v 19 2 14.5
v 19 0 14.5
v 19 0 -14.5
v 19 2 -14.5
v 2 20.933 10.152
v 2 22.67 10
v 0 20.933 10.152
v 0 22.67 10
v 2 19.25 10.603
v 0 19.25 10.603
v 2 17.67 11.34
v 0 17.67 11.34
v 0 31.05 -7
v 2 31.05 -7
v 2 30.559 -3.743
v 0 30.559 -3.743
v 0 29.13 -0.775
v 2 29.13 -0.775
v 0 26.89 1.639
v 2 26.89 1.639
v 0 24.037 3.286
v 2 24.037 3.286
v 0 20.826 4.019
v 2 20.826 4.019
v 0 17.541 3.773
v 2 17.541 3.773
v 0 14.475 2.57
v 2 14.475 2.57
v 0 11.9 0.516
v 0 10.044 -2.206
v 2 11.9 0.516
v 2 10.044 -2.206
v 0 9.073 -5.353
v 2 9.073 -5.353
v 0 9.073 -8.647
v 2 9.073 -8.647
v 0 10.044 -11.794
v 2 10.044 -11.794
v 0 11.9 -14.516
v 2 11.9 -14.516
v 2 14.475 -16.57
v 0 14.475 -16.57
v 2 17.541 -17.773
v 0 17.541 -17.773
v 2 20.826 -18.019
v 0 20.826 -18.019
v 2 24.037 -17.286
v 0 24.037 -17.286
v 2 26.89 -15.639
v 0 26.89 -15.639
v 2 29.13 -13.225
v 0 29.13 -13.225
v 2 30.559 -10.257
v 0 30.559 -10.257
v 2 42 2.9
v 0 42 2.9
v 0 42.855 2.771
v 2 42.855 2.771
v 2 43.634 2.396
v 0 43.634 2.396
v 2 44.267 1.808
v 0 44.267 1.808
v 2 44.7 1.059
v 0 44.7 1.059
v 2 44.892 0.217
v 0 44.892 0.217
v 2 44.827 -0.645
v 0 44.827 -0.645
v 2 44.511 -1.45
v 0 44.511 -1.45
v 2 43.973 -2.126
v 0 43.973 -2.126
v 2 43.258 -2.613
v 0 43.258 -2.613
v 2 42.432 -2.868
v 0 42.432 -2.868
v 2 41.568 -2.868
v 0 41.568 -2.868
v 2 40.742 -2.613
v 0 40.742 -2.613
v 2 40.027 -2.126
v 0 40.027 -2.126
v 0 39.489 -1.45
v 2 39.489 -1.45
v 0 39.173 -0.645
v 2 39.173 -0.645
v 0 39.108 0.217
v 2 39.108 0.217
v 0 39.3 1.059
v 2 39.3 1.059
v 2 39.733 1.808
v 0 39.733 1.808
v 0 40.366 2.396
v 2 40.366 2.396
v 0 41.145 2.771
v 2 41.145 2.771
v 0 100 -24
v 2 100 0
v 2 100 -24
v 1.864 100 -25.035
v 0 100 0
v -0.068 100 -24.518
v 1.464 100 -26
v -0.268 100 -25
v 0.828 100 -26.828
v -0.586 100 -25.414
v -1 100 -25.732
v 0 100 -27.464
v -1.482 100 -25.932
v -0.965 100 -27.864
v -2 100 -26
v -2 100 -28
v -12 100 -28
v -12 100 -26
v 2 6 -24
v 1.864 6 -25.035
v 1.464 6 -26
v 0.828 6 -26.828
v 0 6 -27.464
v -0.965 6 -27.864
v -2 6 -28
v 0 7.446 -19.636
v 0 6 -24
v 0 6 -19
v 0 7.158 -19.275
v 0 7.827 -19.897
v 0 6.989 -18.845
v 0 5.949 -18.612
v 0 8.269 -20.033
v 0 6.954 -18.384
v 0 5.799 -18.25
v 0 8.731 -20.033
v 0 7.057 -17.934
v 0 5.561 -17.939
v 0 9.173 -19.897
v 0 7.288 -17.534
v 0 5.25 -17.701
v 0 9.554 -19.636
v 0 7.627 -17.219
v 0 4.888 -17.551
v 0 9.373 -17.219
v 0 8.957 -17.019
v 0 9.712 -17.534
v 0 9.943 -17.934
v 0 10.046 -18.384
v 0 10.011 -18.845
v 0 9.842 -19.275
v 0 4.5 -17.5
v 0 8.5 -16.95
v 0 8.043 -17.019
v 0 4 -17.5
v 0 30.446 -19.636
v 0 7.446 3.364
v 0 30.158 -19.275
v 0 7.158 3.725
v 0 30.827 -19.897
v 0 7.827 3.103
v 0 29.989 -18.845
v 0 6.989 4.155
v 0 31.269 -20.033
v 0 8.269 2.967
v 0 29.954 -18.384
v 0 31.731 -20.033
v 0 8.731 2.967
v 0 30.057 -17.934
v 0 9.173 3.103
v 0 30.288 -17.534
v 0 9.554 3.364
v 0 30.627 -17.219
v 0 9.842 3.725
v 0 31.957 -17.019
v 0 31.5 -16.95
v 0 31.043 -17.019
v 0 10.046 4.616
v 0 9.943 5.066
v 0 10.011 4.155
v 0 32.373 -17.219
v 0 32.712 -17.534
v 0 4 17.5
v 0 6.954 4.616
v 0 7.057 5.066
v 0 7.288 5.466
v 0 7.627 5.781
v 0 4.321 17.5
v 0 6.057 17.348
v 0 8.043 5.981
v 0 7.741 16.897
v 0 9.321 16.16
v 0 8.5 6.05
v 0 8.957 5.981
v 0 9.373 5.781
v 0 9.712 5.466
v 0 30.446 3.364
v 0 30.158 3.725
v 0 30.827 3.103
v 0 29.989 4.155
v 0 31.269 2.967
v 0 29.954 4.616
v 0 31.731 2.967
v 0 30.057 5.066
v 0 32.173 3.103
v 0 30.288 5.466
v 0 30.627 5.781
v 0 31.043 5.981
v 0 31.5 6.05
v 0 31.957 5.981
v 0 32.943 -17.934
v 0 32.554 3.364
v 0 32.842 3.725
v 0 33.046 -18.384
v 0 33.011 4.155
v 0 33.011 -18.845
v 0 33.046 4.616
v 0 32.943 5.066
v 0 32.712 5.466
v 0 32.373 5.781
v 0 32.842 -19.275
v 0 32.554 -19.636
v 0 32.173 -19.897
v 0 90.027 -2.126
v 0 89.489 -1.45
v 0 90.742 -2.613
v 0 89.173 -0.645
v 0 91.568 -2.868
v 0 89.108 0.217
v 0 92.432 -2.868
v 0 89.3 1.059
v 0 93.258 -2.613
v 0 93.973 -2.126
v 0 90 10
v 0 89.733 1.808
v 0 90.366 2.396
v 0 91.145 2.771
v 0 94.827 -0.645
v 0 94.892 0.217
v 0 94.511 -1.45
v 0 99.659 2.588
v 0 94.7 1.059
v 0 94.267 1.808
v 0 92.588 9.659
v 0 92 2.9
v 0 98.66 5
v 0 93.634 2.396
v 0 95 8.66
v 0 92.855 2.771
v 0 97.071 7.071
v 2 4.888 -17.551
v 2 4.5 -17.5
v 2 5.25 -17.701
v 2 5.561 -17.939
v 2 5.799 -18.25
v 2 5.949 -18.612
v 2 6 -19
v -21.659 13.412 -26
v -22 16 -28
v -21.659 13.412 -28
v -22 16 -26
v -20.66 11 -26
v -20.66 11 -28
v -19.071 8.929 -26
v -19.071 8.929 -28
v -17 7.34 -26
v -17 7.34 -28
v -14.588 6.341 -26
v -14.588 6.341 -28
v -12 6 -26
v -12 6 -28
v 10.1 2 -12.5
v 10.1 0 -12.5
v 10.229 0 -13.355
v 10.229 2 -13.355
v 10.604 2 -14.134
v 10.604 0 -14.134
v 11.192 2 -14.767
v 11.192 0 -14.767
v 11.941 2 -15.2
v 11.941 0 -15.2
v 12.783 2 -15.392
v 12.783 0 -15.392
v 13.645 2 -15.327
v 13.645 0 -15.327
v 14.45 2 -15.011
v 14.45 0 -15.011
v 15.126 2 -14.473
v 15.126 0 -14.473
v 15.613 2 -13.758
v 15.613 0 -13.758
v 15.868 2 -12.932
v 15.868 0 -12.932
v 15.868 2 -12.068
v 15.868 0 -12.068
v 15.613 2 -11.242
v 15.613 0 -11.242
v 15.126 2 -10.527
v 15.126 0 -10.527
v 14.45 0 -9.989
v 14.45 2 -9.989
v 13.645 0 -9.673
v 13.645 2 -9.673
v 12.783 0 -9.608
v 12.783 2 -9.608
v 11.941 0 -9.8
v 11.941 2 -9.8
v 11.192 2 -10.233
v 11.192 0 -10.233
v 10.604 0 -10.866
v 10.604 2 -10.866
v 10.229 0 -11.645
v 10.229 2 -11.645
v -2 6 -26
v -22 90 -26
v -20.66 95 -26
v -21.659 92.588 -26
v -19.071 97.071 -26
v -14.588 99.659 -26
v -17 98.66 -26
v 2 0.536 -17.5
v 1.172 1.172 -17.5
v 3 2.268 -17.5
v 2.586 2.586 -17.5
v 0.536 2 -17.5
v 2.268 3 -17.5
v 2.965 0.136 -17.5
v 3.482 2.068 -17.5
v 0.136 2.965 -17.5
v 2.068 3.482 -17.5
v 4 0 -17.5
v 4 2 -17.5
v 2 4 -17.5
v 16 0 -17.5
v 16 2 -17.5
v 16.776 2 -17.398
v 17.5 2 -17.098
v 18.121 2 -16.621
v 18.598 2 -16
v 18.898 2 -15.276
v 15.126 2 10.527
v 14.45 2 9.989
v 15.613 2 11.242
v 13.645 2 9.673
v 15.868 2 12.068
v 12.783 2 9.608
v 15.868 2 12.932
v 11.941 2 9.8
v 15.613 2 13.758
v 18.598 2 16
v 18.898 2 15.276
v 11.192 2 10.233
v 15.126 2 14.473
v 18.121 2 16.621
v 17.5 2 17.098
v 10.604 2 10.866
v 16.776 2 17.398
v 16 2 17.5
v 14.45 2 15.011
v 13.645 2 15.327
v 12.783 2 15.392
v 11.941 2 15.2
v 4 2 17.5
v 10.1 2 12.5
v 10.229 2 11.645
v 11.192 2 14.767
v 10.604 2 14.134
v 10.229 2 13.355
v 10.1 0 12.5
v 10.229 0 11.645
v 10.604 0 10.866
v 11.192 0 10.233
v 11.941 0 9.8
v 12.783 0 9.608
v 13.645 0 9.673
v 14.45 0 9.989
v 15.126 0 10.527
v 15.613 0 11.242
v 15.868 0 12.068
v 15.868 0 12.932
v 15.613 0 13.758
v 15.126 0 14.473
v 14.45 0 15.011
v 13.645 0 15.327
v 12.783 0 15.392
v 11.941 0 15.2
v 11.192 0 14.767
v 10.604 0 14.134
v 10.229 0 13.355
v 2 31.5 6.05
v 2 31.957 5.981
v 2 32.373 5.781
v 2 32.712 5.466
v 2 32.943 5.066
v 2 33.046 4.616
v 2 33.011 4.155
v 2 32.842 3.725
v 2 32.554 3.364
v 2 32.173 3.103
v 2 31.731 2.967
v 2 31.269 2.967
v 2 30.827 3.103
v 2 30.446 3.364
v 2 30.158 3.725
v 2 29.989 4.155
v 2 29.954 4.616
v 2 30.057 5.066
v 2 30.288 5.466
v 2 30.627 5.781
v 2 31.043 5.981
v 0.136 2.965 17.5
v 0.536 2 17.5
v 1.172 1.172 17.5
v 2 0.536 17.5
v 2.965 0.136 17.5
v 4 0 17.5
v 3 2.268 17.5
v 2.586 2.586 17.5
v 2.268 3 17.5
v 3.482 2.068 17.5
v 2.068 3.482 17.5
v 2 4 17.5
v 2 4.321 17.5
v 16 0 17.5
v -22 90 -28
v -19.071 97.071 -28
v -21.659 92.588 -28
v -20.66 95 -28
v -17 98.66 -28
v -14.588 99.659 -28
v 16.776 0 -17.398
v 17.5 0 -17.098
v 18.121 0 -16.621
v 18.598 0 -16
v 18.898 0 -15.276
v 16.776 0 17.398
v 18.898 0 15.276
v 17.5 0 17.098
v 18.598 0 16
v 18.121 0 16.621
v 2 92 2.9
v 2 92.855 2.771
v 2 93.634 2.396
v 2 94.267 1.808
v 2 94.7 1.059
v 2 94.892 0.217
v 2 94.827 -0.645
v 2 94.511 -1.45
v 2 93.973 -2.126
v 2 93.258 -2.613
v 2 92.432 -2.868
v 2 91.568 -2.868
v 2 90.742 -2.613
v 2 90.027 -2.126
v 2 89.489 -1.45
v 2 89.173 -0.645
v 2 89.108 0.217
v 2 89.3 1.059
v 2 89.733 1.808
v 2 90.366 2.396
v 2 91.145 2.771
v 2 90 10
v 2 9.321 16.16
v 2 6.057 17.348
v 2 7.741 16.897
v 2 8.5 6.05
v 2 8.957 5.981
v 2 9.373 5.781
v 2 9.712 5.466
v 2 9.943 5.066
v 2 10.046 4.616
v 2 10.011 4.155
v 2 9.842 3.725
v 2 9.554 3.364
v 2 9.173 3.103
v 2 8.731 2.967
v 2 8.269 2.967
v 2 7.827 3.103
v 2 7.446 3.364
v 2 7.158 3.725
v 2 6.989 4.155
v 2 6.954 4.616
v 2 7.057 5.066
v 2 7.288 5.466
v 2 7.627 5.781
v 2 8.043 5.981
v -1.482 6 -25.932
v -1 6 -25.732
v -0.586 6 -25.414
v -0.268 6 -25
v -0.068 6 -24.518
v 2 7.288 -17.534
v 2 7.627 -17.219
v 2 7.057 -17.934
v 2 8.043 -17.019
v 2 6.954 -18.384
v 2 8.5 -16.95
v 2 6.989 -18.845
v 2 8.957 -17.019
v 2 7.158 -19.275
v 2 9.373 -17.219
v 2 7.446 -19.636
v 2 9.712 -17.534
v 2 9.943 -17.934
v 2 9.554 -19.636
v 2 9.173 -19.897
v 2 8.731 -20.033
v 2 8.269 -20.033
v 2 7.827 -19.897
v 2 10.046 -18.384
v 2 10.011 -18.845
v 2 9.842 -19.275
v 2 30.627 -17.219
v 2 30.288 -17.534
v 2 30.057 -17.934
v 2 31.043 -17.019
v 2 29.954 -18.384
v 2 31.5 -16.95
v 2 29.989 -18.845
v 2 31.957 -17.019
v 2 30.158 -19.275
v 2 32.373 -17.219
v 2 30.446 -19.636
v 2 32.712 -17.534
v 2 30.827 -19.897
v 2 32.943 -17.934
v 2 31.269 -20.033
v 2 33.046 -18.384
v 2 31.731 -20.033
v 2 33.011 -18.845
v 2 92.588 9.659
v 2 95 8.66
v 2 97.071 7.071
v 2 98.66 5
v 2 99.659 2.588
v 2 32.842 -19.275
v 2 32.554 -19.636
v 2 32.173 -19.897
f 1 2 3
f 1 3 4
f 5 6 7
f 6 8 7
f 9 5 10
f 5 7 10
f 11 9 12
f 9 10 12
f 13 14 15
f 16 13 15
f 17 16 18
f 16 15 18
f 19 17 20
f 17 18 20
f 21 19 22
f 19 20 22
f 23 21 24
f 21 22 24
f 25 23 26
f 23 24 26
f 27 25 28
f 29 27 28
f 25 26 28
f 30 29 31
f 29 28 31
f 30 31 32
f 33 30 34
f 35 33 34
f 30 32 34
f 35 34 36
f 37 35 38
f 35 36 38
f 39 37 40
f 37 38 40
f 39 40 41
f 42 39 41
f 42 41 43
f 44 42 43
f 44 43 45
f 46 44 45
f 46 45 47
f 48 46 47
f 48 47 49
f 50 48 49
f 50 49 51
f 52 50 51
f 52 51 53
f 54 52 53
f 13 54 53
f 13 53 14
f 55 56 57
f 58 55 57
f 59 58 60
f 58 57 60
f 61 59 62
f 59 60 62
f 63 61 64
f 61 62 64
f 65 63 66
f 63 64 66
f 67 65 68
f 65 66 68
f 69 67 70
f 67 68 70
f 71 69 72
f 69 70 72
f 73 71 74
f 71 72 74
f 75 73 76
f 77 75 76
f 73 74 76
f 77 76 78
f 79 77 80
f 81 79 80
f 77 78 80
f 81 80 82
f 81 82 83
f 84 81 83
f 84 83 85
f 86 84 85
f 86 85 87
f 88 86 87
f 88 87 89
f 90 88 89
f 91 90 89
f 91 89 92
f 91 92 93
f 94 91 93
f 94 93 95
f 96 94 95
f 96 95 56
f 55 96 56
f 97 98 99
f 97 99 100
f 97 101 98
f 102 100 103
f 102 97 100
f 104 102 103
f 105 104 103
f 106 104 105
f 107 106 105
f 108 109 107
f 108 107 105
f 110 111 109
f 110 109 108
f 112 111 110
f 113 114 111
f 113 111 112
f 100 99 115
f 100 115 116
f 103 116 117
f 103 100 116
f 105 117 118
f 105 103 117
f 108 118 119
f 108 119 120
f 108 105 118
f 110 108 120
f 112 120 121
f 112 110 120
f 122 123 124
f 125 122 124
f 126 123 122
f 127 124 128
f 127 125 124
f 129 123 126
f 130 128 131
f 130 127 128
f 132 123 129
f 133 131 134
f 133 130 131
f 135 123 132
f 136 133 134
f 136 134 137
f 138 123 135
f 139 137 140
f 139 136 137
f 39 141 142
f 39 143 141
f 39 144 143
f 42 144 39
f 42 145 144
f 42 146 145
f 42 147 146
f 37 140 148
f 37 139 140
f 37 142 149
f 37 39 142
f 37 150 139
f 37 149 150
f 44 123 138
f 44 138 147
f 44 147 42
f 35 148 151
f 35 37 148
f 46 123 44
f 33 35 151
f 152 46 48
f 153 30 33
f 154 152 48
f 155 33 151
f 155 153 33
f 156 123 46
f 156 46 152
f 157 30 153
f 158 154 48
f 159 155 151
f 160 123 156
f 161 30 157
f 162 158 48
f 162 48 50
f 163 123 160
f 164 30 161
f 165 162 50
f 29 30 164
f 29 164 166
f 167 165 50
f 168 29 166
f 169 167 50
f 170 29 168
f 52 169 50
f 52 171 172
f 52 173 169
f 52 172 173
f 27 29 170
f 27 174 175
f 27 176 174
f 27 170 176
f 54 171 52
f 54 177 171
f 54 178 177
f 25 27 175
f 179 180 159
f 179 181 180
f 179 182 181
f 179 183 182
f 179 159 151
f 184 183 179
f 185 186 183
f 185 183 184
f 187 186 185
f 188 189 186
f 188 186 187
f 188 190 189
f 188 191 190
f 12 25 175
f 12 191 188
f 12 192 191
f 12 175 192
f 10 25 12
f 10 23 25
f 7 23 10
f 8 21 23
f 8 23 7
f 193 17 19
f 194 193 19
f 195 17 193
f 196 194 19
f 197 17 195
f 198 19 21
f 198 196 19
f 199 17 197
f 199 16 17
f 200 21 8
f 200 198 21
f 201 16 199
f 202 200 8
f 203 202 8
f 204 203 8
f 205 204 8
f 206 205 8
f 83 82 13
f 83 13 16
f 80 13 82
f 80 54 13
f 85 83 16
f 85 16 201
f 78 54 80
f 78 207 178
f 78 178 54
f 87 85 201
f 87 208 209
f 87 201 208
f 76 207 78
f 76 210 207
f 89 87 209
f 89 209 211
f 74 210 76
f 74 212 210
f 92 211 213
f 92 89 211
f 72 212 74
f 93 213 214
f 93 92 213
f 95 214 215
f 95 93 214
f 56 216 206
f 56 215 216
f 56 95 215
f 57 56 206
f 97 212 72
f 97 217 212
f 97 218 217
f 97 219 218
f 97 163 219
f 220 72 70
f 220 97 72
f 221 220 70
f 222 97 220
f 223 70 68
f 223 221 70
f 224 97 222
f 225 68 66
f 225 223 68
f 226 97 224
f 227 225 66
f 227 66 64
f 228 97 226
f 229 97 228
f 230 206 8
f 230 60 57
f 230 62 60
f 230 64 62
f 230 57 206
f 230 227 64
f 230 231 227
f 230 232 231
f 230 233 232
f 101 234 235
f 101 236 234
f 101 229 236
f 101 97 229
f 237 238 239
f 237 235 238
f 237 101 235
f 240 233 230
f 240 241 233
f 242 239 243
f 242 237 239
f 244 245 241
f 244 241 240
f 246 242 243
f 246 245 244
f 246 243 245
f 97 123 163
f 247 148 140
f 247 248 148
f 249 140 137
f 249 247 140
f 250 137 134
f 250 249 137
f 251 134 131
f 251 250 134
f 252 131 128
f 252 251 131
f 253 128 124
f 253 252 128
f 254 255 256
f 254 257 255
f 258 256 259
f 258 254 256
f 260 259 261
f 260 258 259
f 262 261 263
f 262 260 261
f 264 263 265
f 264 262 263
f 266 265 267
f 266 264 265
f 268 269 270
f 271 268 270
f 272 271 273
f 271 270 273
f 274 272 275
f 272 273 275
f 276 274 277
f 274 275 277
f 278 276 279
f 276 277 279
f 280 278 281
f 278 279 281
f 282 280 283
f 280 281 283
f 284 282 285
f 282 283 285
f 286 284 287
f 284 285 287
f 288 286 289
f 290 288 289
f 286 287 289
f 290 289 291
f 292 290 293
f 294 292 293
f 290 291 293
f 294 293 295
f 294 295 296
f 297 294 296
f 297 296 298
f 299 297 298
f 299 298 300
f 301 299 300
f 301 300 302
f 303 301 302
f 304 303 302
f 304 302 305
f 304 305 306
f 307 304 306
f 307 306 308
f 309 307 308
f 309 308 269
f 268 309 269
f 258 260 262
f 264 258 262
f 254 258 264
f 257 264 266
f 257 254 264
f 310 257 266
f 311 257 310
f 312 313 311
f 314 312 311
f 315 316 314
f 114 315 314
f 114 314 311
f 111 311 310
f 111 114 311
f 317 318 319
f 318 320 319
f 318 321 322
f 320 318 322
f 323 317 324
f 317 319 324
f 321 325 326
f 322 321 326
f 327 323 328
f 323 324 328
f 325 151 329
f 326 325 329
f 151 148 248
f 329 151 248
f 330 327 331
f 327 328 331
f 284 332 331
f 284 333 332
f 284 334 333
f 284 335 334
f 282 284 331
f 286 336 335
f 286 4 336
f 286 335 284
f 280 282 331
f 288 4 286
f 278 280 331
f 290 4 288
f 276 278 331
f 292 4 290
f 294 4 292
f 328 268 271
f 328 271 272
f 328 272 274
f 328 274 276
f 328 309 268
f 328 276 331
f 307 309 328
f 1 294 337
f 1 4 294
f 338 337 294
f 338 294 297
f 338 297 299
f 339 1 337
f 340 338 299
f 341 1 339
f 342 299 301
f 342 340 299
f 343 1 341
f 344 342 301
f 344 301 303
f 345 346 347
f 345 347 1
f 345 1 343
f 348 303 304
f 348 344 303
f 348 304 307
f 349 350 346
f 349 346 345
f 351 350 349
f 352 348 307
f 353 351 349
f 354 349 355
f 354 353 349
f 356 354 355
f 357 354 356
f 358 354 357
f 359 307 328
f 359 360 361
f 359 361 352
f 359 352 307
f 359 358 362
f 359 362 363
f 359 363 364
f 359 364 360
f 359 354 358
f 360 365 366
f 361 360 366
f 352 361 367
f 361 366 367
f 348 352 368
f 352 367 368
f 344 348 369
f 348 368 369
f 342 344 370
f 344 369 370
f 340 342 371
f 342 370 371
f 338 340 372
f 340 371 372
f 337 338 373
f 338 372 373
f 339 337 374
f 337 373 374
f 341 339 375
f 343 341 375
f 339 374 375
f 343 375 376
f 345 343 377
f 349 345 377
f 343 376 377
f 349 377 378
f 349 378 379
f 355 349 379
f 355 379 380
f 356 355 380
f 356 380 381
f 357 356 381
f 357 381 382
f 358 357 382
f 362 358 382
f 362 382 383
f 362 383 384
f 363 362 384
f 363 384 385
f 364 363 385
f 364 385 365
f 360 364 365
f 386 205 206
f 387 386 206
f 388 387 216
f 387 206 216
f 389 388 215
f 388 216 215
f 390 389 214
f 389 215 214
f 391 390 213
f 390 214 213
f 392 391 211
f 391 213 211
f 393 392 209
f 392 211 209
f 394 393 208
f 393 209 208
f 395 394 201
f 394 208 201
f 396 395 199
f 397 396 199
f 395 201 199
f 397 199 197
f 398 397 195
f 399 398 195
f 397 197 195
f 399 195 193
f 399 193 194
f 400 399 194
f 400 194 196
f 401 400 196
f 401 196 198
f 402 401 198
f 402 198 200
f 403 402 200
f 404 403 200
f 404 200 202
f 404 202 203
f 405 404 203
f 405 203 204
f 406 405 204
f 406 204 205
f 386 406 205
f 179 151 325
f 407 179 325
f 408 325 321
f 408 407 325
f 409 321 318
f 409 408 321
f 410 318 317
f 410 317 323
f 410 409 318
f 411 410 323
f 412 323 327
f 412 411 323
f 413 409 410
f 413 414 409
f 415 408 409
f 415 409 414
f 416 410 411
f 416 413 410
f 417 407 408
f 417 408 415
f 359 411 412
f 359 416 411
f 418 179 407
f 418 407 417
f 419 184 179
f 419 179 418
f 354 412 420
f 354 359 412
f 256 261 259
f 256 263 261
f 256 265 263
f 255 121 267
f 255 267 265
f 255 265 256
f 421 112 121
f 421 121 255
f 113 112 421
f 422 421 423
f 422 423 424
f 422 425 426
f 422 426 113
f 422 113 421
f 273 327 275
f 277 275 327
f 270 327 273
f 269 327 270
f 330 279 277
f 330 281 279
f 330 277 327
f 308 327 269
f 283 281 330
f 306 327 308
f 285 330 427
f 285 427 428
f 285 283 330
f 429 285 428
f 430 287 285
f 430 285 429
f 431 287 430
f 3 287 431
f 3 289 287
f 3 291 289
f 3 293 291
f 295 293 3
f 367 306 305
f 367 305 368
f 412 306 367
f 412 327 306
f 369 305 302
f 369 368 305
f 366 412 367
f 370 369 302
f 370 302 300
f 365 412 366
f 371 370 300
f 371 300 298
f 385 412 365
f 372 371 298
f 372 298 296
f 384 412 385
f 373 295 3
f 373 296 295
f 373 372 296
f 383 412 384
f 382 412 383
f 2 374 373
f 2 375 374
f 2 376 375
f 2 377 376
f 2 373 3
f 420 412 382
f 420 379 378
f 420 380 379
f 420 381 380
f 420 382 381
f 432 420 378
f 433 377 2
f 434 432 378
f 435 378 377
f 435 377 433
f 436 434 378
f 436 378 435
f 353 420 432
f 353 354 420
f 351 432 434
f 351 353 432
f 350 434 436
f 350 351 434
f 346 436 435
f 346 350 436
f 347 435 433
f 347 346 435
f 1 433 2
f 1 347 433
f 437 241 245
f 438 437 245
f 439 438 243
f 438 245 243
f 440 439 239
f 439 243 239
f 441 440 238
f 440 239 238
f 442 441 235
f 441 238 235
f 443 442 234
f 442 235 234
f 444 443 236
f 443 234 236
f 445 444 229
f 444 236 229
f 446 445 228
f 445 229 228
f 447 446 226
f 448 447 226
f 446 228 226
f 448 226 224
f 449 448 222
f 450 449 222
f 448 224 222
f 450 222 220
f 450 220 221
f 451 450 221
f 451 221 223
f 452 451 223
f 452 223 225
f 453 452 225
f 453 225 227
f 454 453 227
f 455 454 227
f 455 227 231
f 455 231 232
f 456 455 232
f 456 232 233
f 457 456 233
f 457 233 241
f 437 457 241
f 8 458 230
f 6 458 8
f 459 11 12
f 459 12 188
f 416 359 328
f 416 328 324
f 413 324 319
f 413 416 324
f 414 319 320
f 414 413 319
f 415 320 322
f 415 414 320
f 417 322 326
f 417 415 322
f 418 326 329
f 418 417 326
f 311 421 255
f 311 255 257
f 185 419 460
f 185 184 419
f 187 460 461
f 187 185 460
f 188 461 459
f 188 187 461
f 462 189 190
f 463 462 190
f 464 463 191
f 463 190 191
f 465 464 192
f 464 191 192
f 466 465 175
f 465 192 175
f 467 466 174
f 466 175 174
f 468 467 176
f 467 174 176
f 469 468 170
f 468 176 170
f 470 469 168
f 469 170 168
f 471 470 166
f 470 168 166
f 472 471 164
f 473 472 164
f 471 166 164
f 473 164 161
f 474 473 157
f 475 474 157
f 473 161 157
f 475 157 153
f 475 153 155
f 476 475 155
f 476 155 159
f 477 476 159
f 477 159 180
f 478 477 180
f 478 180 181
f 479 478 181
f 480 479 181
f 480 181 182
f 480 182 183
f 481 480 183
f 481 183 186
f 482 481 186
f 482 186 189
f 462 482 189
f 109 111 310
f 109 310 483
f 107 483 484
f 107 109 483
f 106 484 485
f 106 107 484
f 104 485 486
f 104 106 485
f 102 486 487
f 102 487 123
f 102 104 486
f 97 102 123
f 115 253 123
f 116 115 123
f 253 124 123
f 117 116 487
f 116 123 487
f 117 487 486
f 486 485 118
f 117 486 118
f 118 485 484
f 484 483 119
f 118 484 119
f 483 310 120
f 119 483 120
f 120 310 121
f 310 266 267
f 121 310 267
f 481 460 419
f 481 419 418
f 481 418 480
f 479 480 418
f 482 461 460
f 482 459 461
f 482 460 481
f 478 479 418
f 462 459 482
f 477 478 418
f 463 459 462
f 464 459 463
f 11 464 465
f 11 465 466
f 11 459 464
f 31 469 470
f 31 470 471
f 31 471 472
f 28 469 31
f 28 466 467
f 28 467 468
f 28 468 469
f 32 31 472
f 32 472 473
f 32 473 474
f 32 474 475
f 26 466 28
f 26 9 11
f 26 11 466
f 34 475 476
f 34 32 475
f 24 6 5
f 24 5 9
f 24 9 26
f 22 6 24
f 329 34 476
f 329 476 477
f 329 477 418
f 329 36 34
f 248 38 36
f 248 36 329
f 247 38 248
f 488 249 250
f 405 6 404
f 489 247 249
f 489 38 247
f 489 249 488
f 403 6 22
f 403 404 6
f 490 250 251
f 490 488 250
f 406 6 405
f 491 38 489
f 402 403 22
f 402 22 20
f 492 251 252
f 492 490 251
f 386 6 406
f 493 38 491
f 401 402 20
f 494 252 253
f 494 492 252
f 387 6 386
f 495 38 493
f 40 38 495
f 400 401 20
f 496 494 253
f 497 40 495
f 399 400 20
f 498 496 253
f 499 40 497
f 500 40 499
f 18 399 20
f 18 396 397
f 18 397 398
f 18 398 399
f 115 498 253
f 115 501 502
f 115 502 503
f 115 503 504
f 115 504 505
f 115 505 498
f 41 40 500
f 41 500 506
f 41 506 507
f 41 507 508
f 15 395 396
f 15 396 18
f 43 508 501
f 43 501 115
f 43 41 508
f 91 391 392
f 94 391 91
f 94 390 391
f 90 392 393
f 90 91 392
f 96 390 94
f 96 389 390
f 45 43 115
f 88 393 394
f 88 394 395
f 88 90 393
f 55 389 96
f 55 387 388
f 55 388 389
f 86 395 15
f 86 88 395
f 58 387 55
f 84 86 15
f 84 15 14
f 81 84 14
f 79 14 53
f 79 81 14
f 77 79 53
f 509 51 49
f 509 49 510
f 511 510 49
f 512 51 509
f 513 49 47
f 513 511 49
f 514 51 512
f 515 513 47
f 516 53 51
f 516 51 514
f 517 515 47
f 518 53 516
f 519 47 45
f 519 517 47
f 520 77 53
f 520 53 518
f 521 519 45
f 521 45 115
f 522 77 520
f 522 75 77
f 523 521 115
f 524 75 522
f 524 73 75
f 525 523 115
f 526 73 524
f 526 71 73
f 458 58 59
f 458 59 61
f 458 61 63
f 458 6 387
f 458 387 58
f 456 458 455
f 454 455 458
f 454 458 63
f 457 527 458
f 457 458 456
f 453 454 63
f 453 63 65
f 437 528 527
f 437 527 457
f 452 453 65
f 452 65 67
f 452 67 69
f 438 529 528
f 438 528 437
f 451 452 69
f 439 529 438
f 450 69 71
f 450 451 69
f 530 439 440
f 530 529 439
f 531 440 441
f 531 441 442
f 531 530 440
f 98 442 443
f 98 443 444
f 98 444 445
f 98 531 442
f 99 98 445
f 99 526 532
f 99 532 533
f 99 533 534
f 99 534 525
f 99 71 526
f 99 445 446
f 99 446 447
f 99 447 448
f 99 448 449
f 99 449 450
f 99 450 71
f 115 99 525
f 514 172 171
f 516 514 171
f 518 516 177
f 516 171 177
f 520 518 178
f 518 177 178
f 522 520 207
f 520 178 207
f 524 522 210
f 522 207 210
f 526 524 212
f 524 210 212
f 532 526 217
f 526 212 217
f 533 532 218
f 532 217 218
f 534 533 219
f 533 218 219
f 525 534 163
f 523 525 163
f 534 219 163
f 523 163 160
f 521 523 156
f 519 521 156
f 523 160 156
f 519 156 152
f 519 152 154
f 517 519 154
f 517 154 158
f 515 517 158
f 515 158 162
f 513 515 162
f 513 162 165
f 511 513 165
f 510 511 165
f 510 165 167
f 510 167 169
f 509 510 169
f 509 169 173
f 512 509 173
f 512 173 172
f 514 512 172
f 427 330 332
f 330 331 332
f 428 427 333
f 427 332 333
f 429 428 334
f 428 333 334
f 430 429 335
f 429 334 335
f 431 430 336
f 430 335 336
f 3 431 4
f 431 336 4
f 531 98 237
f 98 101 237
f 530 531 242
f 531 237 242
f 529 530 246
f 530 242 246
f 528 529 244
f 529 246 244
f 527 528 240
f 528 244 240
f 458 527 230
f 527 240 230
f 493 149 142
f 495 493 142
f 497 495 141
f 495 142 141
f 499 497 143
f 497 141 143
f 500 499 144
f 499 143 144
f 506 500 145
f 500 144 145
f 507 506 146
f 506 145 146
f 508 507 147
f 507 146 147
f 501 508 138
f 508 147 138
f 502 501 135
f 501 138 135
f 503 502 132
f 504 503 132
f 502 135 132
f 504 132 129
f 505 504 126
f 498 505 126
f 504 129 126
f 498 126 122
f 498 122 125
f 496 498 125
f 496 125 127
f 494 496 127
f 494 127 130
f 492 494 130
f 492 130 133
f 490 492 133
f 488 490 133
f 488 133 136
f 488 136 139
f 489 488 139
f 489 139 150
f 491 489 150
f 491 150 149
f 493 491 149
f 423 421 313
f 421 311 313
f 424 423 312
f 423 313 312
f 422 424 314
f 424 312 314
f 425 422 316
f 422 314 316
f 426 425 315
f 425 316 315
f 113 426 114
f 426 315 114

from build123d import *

# Parameters (mm, degrees)
BASE_FLANGE1_DEPTH     = 17.5
M5_CLEARANCE_HOLE2_D   = 5.8
M5_CLEARANCE_HOLE1_D   = 5.8
BOSS_EXTRUDE1_DEPTH    = 2
M2_5_CLEARANCE_HOLE1_D = 3.1
SKETCH13_R             = 11.05
CUT_EXTRUDE2_DEPTH     = 10
SKETCH16_W             = 3.5
SKETCH16_H             = 66
BOSS_EXTRUDE2_DEPTH    = 2
EDGE_FLANGE1_DEPTH     = 94
CUT_EXTRUDE3_DEPTH     = 2
FILLET1_R              = 10
FILLET2_R              = 3
FILLET3_R              = 1.5


# Sheet-metal steps are written as plain solids
with BuildPart() as part:
    # Sketch1 → Base-Flange1 (new, symmetric)
    with BuildSketch(Plane.XY):
        with BuildLine():
            Line((0, 100), (0, 4))
            ThreePointArc((0, 4), (1.171572875, 1.171572875), (4, 0))
            Line((4, 0), (19, 0))
            Line((19, 0), (19, 2))
            Line((19, 2), (4, 2))
            ThreePointArc((4, 2), (2.585786438, 2.585786438), (2, 4))
            Line((2, 4), (2, 100))
            Line((2, 100), (0, 100))
        make_face()
    extrude(amount=BASE_FLANGE1_DEPTH, both=True)

    # M5 Clearance Hole2 (through all)
    with Locations(Plane(origin=(0, 2, 0), x_dir=(1, 0, 0), z_dir=(0, 1, 0))):
        with Locations((13, -12.5), (13, 12.5)):
            Hole(M5_CLEARANCE_HOLE2_D / 2)

    # M5 Clearance Hole1 (through all)
    with Locations(Plane(origin=(2, 0, 0), x_dir=(0, 0, -1), z_dir=(1, 0, 0))):
        with Locations((0, 92), (0, 42)):
            Hole(M5_CLEARANCE_HOLE1_D / 2)

    # Sketch12 → Boss-Extrude1 (add)
    with BuildSketch(Plane(origin=(2, 0, 0), x_dir=(0, 0, -1), z_dir=(1, 0, 0))):
        Polygon((16.892359744, 6), (21, 6), (21, 34), (14.5, 34), align=None)
    extrude(amount=-BOSS_EXTRUDE1_DEPTH)

    # M2.5 Clearance Hole1 (through all)
    with Locations(Plane(origin=(2, 0, 0), x_dir=(0, 0, -1), z_dir=(1, 0, 0))):
        with Locations((18.5, 8.5), (-4.5, 8.5), (-4.5, 31.5), (18.5, 31.5)):
            Hole(M2_5_CLEARANCE_HOLE1_D / 2)

    # Sketch13 → Cut-Extrude2 (cut)
    with BuildSketch(Plane(origin=(2, 0, 0), x_dir=(0, 0, -1), z_dir=(1, 0, 0))):
        with Locations(Location((7, 20, 0), (0, 0, 90))):
            Circle(SKETCH13_R)
    extrude(amount=-CUT_EXTRUDE2_DEPTH, mode=Mode.SUBTRACT)

    # Sketch16 → Boss-Extrude2 (add)
    with BuildSketch(Plane(origin=(2, 0, 0), x_dir=(0, 0, -1), z_dir=(1, 0, 0))):
        with Locations((19.25, 67)):
            Rectangle(SKETCH16_W, SKETCH16_H)
    extrude(amount=-BOSS_EXTRUDE2_DEPTH)

    # Edge-Flange1 section (across the edge) → Edge-Flange1 (add)
    with BuildSketch(Plane(origin=(0, 100, -26), x_dir=(0, 0, 1), z_dir=(0, -1, 0))):
        with BuildLine():
            Line((-2, 2), (-2, 22))
            Line((-2, 22), (0, 22))
            Line((0, 22), (0, 2))
            ThreePointArc((0, 2), (0.585786438, 0.585786438), (2, 0))
            Line((2, 0), (5, 0))
            Line((5, 0), (5, -2))
            Line((5, -2), (2, -2))
            ThreePointArc((2, -2), (-0.828427125, -0.828427125), (-2, 2))
        make_face()
    extrude(amount=EDGE_FLANGE1_DEPTH)

    # Sketch20 → Cut-Extrude3 (cut)
    with BuildSketch(Plane(origin=(2, 0, 0), x_dir=(0, 0, -1), z_dir=(1, 0, 0))):
        Polygon((-10, 100), (-10, 19.990381057), (-17.5, 7), (-17.5, 100), align=None)
    extrude(amount=-CUT_EXTRUDE3_DEPTH, mode=Mode.SUBTRACT)

    # Fillet1
    fillet1_edges = [part.edges().sort_by_distance(p)[0] for p in [
        (-22, 100, -27),
        (-22, 6, -27),
        (1, 100, 10),
        (1, 19.990381057, 10),
        (1, 7, 17.5),
    ]]
    fillet(fillet1_edges, radius=FILLET1_R)

    # Fillet2
    fillet2_edges = [part.edges().sort_by_distance(p)[0] for p in [
        (19, 1, 17.5),
        (19, 1, -17.5),
    ]]
    fillet(fillet2_edges, radius=FILLET2_R)

    # Fillet3
    fillet3_edges = [part.edges().sort_by_distance(p)[0] for p in [
        (1, 6, -17.5),
    ]]
    fillet(fillet3_edges, radius=FILLET3_R)


solid = part.part
